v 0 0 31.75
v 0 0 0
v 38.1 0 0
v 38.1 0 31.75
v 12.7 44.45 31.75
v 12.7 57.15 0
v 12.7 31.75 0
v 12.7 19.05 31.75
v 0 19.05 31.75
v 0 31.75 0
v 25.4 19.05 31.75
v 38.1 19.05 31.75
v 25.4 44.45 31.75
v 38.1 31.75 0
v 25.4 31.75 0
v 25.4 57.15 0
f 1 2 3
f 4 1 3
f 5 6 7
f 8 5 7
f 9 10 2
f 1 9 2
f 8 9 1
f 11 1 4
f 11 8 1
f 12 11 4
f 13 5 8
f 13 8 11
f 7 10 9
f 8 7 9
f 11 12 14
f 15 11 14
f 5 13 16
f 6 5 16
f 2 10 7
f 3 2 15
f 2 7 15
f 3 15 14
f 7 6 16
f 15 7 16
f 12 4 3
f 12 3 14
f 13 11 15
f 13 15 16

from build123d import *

# Parameters (mm, degrees)
F1_DEPTH = 31.75
F3_DEPTH = 12.7
F5_DEPTH = 12.7
F7_DEPTH = 12.7


with BuildPart() as f1:
    # F0 (on Top) → F1 (new body)
    with BuildSketch(Plane.XY):
        Polygon((0, 31.75), (0, 0), (38.1, 0), (38.1, 31.75), (25.4, 31.75), (25.4, 57.15), (12.7, 57.15), (12.7, 31.75), align=None)
    extrude(amount=F1_DEPTH)

    # F2 (on face) → F3 (cut)
    with BuildSketch(Plane(origin=(0, 0, 0), x_dir=(0, -1, 0), z_dir=(-1, 0, 0))):
        Polygon((-31.75, 31.75), (-31.75, 0), (-19.05, 31.75), align=None)
    extrude(amount=-F3_DEPTH, mode=Mode.SUBTRACT)

    # F4 (on face) → F5 (cut)
    with BuildSketch(Plane.YZ.offset(38.1)):
        Polygon((19.05, 31.75), (31.75, 0), (31.75, 31.75), align=None)
    extrude(amount=-F5_DEPTH, mode=Mode.SUBTRACT)

    # F6 (on face) → F7 (cut)
    with BuildSketch(Plane.YZ.offset(25.4)):
        Polygon((57.15, 0), (57.15, 31.75), (44.45, 31.75), align=None)
    extrude(amount=-F7_DEPTH, mode=Mode.SUBTRACT)


solid = f1.part
